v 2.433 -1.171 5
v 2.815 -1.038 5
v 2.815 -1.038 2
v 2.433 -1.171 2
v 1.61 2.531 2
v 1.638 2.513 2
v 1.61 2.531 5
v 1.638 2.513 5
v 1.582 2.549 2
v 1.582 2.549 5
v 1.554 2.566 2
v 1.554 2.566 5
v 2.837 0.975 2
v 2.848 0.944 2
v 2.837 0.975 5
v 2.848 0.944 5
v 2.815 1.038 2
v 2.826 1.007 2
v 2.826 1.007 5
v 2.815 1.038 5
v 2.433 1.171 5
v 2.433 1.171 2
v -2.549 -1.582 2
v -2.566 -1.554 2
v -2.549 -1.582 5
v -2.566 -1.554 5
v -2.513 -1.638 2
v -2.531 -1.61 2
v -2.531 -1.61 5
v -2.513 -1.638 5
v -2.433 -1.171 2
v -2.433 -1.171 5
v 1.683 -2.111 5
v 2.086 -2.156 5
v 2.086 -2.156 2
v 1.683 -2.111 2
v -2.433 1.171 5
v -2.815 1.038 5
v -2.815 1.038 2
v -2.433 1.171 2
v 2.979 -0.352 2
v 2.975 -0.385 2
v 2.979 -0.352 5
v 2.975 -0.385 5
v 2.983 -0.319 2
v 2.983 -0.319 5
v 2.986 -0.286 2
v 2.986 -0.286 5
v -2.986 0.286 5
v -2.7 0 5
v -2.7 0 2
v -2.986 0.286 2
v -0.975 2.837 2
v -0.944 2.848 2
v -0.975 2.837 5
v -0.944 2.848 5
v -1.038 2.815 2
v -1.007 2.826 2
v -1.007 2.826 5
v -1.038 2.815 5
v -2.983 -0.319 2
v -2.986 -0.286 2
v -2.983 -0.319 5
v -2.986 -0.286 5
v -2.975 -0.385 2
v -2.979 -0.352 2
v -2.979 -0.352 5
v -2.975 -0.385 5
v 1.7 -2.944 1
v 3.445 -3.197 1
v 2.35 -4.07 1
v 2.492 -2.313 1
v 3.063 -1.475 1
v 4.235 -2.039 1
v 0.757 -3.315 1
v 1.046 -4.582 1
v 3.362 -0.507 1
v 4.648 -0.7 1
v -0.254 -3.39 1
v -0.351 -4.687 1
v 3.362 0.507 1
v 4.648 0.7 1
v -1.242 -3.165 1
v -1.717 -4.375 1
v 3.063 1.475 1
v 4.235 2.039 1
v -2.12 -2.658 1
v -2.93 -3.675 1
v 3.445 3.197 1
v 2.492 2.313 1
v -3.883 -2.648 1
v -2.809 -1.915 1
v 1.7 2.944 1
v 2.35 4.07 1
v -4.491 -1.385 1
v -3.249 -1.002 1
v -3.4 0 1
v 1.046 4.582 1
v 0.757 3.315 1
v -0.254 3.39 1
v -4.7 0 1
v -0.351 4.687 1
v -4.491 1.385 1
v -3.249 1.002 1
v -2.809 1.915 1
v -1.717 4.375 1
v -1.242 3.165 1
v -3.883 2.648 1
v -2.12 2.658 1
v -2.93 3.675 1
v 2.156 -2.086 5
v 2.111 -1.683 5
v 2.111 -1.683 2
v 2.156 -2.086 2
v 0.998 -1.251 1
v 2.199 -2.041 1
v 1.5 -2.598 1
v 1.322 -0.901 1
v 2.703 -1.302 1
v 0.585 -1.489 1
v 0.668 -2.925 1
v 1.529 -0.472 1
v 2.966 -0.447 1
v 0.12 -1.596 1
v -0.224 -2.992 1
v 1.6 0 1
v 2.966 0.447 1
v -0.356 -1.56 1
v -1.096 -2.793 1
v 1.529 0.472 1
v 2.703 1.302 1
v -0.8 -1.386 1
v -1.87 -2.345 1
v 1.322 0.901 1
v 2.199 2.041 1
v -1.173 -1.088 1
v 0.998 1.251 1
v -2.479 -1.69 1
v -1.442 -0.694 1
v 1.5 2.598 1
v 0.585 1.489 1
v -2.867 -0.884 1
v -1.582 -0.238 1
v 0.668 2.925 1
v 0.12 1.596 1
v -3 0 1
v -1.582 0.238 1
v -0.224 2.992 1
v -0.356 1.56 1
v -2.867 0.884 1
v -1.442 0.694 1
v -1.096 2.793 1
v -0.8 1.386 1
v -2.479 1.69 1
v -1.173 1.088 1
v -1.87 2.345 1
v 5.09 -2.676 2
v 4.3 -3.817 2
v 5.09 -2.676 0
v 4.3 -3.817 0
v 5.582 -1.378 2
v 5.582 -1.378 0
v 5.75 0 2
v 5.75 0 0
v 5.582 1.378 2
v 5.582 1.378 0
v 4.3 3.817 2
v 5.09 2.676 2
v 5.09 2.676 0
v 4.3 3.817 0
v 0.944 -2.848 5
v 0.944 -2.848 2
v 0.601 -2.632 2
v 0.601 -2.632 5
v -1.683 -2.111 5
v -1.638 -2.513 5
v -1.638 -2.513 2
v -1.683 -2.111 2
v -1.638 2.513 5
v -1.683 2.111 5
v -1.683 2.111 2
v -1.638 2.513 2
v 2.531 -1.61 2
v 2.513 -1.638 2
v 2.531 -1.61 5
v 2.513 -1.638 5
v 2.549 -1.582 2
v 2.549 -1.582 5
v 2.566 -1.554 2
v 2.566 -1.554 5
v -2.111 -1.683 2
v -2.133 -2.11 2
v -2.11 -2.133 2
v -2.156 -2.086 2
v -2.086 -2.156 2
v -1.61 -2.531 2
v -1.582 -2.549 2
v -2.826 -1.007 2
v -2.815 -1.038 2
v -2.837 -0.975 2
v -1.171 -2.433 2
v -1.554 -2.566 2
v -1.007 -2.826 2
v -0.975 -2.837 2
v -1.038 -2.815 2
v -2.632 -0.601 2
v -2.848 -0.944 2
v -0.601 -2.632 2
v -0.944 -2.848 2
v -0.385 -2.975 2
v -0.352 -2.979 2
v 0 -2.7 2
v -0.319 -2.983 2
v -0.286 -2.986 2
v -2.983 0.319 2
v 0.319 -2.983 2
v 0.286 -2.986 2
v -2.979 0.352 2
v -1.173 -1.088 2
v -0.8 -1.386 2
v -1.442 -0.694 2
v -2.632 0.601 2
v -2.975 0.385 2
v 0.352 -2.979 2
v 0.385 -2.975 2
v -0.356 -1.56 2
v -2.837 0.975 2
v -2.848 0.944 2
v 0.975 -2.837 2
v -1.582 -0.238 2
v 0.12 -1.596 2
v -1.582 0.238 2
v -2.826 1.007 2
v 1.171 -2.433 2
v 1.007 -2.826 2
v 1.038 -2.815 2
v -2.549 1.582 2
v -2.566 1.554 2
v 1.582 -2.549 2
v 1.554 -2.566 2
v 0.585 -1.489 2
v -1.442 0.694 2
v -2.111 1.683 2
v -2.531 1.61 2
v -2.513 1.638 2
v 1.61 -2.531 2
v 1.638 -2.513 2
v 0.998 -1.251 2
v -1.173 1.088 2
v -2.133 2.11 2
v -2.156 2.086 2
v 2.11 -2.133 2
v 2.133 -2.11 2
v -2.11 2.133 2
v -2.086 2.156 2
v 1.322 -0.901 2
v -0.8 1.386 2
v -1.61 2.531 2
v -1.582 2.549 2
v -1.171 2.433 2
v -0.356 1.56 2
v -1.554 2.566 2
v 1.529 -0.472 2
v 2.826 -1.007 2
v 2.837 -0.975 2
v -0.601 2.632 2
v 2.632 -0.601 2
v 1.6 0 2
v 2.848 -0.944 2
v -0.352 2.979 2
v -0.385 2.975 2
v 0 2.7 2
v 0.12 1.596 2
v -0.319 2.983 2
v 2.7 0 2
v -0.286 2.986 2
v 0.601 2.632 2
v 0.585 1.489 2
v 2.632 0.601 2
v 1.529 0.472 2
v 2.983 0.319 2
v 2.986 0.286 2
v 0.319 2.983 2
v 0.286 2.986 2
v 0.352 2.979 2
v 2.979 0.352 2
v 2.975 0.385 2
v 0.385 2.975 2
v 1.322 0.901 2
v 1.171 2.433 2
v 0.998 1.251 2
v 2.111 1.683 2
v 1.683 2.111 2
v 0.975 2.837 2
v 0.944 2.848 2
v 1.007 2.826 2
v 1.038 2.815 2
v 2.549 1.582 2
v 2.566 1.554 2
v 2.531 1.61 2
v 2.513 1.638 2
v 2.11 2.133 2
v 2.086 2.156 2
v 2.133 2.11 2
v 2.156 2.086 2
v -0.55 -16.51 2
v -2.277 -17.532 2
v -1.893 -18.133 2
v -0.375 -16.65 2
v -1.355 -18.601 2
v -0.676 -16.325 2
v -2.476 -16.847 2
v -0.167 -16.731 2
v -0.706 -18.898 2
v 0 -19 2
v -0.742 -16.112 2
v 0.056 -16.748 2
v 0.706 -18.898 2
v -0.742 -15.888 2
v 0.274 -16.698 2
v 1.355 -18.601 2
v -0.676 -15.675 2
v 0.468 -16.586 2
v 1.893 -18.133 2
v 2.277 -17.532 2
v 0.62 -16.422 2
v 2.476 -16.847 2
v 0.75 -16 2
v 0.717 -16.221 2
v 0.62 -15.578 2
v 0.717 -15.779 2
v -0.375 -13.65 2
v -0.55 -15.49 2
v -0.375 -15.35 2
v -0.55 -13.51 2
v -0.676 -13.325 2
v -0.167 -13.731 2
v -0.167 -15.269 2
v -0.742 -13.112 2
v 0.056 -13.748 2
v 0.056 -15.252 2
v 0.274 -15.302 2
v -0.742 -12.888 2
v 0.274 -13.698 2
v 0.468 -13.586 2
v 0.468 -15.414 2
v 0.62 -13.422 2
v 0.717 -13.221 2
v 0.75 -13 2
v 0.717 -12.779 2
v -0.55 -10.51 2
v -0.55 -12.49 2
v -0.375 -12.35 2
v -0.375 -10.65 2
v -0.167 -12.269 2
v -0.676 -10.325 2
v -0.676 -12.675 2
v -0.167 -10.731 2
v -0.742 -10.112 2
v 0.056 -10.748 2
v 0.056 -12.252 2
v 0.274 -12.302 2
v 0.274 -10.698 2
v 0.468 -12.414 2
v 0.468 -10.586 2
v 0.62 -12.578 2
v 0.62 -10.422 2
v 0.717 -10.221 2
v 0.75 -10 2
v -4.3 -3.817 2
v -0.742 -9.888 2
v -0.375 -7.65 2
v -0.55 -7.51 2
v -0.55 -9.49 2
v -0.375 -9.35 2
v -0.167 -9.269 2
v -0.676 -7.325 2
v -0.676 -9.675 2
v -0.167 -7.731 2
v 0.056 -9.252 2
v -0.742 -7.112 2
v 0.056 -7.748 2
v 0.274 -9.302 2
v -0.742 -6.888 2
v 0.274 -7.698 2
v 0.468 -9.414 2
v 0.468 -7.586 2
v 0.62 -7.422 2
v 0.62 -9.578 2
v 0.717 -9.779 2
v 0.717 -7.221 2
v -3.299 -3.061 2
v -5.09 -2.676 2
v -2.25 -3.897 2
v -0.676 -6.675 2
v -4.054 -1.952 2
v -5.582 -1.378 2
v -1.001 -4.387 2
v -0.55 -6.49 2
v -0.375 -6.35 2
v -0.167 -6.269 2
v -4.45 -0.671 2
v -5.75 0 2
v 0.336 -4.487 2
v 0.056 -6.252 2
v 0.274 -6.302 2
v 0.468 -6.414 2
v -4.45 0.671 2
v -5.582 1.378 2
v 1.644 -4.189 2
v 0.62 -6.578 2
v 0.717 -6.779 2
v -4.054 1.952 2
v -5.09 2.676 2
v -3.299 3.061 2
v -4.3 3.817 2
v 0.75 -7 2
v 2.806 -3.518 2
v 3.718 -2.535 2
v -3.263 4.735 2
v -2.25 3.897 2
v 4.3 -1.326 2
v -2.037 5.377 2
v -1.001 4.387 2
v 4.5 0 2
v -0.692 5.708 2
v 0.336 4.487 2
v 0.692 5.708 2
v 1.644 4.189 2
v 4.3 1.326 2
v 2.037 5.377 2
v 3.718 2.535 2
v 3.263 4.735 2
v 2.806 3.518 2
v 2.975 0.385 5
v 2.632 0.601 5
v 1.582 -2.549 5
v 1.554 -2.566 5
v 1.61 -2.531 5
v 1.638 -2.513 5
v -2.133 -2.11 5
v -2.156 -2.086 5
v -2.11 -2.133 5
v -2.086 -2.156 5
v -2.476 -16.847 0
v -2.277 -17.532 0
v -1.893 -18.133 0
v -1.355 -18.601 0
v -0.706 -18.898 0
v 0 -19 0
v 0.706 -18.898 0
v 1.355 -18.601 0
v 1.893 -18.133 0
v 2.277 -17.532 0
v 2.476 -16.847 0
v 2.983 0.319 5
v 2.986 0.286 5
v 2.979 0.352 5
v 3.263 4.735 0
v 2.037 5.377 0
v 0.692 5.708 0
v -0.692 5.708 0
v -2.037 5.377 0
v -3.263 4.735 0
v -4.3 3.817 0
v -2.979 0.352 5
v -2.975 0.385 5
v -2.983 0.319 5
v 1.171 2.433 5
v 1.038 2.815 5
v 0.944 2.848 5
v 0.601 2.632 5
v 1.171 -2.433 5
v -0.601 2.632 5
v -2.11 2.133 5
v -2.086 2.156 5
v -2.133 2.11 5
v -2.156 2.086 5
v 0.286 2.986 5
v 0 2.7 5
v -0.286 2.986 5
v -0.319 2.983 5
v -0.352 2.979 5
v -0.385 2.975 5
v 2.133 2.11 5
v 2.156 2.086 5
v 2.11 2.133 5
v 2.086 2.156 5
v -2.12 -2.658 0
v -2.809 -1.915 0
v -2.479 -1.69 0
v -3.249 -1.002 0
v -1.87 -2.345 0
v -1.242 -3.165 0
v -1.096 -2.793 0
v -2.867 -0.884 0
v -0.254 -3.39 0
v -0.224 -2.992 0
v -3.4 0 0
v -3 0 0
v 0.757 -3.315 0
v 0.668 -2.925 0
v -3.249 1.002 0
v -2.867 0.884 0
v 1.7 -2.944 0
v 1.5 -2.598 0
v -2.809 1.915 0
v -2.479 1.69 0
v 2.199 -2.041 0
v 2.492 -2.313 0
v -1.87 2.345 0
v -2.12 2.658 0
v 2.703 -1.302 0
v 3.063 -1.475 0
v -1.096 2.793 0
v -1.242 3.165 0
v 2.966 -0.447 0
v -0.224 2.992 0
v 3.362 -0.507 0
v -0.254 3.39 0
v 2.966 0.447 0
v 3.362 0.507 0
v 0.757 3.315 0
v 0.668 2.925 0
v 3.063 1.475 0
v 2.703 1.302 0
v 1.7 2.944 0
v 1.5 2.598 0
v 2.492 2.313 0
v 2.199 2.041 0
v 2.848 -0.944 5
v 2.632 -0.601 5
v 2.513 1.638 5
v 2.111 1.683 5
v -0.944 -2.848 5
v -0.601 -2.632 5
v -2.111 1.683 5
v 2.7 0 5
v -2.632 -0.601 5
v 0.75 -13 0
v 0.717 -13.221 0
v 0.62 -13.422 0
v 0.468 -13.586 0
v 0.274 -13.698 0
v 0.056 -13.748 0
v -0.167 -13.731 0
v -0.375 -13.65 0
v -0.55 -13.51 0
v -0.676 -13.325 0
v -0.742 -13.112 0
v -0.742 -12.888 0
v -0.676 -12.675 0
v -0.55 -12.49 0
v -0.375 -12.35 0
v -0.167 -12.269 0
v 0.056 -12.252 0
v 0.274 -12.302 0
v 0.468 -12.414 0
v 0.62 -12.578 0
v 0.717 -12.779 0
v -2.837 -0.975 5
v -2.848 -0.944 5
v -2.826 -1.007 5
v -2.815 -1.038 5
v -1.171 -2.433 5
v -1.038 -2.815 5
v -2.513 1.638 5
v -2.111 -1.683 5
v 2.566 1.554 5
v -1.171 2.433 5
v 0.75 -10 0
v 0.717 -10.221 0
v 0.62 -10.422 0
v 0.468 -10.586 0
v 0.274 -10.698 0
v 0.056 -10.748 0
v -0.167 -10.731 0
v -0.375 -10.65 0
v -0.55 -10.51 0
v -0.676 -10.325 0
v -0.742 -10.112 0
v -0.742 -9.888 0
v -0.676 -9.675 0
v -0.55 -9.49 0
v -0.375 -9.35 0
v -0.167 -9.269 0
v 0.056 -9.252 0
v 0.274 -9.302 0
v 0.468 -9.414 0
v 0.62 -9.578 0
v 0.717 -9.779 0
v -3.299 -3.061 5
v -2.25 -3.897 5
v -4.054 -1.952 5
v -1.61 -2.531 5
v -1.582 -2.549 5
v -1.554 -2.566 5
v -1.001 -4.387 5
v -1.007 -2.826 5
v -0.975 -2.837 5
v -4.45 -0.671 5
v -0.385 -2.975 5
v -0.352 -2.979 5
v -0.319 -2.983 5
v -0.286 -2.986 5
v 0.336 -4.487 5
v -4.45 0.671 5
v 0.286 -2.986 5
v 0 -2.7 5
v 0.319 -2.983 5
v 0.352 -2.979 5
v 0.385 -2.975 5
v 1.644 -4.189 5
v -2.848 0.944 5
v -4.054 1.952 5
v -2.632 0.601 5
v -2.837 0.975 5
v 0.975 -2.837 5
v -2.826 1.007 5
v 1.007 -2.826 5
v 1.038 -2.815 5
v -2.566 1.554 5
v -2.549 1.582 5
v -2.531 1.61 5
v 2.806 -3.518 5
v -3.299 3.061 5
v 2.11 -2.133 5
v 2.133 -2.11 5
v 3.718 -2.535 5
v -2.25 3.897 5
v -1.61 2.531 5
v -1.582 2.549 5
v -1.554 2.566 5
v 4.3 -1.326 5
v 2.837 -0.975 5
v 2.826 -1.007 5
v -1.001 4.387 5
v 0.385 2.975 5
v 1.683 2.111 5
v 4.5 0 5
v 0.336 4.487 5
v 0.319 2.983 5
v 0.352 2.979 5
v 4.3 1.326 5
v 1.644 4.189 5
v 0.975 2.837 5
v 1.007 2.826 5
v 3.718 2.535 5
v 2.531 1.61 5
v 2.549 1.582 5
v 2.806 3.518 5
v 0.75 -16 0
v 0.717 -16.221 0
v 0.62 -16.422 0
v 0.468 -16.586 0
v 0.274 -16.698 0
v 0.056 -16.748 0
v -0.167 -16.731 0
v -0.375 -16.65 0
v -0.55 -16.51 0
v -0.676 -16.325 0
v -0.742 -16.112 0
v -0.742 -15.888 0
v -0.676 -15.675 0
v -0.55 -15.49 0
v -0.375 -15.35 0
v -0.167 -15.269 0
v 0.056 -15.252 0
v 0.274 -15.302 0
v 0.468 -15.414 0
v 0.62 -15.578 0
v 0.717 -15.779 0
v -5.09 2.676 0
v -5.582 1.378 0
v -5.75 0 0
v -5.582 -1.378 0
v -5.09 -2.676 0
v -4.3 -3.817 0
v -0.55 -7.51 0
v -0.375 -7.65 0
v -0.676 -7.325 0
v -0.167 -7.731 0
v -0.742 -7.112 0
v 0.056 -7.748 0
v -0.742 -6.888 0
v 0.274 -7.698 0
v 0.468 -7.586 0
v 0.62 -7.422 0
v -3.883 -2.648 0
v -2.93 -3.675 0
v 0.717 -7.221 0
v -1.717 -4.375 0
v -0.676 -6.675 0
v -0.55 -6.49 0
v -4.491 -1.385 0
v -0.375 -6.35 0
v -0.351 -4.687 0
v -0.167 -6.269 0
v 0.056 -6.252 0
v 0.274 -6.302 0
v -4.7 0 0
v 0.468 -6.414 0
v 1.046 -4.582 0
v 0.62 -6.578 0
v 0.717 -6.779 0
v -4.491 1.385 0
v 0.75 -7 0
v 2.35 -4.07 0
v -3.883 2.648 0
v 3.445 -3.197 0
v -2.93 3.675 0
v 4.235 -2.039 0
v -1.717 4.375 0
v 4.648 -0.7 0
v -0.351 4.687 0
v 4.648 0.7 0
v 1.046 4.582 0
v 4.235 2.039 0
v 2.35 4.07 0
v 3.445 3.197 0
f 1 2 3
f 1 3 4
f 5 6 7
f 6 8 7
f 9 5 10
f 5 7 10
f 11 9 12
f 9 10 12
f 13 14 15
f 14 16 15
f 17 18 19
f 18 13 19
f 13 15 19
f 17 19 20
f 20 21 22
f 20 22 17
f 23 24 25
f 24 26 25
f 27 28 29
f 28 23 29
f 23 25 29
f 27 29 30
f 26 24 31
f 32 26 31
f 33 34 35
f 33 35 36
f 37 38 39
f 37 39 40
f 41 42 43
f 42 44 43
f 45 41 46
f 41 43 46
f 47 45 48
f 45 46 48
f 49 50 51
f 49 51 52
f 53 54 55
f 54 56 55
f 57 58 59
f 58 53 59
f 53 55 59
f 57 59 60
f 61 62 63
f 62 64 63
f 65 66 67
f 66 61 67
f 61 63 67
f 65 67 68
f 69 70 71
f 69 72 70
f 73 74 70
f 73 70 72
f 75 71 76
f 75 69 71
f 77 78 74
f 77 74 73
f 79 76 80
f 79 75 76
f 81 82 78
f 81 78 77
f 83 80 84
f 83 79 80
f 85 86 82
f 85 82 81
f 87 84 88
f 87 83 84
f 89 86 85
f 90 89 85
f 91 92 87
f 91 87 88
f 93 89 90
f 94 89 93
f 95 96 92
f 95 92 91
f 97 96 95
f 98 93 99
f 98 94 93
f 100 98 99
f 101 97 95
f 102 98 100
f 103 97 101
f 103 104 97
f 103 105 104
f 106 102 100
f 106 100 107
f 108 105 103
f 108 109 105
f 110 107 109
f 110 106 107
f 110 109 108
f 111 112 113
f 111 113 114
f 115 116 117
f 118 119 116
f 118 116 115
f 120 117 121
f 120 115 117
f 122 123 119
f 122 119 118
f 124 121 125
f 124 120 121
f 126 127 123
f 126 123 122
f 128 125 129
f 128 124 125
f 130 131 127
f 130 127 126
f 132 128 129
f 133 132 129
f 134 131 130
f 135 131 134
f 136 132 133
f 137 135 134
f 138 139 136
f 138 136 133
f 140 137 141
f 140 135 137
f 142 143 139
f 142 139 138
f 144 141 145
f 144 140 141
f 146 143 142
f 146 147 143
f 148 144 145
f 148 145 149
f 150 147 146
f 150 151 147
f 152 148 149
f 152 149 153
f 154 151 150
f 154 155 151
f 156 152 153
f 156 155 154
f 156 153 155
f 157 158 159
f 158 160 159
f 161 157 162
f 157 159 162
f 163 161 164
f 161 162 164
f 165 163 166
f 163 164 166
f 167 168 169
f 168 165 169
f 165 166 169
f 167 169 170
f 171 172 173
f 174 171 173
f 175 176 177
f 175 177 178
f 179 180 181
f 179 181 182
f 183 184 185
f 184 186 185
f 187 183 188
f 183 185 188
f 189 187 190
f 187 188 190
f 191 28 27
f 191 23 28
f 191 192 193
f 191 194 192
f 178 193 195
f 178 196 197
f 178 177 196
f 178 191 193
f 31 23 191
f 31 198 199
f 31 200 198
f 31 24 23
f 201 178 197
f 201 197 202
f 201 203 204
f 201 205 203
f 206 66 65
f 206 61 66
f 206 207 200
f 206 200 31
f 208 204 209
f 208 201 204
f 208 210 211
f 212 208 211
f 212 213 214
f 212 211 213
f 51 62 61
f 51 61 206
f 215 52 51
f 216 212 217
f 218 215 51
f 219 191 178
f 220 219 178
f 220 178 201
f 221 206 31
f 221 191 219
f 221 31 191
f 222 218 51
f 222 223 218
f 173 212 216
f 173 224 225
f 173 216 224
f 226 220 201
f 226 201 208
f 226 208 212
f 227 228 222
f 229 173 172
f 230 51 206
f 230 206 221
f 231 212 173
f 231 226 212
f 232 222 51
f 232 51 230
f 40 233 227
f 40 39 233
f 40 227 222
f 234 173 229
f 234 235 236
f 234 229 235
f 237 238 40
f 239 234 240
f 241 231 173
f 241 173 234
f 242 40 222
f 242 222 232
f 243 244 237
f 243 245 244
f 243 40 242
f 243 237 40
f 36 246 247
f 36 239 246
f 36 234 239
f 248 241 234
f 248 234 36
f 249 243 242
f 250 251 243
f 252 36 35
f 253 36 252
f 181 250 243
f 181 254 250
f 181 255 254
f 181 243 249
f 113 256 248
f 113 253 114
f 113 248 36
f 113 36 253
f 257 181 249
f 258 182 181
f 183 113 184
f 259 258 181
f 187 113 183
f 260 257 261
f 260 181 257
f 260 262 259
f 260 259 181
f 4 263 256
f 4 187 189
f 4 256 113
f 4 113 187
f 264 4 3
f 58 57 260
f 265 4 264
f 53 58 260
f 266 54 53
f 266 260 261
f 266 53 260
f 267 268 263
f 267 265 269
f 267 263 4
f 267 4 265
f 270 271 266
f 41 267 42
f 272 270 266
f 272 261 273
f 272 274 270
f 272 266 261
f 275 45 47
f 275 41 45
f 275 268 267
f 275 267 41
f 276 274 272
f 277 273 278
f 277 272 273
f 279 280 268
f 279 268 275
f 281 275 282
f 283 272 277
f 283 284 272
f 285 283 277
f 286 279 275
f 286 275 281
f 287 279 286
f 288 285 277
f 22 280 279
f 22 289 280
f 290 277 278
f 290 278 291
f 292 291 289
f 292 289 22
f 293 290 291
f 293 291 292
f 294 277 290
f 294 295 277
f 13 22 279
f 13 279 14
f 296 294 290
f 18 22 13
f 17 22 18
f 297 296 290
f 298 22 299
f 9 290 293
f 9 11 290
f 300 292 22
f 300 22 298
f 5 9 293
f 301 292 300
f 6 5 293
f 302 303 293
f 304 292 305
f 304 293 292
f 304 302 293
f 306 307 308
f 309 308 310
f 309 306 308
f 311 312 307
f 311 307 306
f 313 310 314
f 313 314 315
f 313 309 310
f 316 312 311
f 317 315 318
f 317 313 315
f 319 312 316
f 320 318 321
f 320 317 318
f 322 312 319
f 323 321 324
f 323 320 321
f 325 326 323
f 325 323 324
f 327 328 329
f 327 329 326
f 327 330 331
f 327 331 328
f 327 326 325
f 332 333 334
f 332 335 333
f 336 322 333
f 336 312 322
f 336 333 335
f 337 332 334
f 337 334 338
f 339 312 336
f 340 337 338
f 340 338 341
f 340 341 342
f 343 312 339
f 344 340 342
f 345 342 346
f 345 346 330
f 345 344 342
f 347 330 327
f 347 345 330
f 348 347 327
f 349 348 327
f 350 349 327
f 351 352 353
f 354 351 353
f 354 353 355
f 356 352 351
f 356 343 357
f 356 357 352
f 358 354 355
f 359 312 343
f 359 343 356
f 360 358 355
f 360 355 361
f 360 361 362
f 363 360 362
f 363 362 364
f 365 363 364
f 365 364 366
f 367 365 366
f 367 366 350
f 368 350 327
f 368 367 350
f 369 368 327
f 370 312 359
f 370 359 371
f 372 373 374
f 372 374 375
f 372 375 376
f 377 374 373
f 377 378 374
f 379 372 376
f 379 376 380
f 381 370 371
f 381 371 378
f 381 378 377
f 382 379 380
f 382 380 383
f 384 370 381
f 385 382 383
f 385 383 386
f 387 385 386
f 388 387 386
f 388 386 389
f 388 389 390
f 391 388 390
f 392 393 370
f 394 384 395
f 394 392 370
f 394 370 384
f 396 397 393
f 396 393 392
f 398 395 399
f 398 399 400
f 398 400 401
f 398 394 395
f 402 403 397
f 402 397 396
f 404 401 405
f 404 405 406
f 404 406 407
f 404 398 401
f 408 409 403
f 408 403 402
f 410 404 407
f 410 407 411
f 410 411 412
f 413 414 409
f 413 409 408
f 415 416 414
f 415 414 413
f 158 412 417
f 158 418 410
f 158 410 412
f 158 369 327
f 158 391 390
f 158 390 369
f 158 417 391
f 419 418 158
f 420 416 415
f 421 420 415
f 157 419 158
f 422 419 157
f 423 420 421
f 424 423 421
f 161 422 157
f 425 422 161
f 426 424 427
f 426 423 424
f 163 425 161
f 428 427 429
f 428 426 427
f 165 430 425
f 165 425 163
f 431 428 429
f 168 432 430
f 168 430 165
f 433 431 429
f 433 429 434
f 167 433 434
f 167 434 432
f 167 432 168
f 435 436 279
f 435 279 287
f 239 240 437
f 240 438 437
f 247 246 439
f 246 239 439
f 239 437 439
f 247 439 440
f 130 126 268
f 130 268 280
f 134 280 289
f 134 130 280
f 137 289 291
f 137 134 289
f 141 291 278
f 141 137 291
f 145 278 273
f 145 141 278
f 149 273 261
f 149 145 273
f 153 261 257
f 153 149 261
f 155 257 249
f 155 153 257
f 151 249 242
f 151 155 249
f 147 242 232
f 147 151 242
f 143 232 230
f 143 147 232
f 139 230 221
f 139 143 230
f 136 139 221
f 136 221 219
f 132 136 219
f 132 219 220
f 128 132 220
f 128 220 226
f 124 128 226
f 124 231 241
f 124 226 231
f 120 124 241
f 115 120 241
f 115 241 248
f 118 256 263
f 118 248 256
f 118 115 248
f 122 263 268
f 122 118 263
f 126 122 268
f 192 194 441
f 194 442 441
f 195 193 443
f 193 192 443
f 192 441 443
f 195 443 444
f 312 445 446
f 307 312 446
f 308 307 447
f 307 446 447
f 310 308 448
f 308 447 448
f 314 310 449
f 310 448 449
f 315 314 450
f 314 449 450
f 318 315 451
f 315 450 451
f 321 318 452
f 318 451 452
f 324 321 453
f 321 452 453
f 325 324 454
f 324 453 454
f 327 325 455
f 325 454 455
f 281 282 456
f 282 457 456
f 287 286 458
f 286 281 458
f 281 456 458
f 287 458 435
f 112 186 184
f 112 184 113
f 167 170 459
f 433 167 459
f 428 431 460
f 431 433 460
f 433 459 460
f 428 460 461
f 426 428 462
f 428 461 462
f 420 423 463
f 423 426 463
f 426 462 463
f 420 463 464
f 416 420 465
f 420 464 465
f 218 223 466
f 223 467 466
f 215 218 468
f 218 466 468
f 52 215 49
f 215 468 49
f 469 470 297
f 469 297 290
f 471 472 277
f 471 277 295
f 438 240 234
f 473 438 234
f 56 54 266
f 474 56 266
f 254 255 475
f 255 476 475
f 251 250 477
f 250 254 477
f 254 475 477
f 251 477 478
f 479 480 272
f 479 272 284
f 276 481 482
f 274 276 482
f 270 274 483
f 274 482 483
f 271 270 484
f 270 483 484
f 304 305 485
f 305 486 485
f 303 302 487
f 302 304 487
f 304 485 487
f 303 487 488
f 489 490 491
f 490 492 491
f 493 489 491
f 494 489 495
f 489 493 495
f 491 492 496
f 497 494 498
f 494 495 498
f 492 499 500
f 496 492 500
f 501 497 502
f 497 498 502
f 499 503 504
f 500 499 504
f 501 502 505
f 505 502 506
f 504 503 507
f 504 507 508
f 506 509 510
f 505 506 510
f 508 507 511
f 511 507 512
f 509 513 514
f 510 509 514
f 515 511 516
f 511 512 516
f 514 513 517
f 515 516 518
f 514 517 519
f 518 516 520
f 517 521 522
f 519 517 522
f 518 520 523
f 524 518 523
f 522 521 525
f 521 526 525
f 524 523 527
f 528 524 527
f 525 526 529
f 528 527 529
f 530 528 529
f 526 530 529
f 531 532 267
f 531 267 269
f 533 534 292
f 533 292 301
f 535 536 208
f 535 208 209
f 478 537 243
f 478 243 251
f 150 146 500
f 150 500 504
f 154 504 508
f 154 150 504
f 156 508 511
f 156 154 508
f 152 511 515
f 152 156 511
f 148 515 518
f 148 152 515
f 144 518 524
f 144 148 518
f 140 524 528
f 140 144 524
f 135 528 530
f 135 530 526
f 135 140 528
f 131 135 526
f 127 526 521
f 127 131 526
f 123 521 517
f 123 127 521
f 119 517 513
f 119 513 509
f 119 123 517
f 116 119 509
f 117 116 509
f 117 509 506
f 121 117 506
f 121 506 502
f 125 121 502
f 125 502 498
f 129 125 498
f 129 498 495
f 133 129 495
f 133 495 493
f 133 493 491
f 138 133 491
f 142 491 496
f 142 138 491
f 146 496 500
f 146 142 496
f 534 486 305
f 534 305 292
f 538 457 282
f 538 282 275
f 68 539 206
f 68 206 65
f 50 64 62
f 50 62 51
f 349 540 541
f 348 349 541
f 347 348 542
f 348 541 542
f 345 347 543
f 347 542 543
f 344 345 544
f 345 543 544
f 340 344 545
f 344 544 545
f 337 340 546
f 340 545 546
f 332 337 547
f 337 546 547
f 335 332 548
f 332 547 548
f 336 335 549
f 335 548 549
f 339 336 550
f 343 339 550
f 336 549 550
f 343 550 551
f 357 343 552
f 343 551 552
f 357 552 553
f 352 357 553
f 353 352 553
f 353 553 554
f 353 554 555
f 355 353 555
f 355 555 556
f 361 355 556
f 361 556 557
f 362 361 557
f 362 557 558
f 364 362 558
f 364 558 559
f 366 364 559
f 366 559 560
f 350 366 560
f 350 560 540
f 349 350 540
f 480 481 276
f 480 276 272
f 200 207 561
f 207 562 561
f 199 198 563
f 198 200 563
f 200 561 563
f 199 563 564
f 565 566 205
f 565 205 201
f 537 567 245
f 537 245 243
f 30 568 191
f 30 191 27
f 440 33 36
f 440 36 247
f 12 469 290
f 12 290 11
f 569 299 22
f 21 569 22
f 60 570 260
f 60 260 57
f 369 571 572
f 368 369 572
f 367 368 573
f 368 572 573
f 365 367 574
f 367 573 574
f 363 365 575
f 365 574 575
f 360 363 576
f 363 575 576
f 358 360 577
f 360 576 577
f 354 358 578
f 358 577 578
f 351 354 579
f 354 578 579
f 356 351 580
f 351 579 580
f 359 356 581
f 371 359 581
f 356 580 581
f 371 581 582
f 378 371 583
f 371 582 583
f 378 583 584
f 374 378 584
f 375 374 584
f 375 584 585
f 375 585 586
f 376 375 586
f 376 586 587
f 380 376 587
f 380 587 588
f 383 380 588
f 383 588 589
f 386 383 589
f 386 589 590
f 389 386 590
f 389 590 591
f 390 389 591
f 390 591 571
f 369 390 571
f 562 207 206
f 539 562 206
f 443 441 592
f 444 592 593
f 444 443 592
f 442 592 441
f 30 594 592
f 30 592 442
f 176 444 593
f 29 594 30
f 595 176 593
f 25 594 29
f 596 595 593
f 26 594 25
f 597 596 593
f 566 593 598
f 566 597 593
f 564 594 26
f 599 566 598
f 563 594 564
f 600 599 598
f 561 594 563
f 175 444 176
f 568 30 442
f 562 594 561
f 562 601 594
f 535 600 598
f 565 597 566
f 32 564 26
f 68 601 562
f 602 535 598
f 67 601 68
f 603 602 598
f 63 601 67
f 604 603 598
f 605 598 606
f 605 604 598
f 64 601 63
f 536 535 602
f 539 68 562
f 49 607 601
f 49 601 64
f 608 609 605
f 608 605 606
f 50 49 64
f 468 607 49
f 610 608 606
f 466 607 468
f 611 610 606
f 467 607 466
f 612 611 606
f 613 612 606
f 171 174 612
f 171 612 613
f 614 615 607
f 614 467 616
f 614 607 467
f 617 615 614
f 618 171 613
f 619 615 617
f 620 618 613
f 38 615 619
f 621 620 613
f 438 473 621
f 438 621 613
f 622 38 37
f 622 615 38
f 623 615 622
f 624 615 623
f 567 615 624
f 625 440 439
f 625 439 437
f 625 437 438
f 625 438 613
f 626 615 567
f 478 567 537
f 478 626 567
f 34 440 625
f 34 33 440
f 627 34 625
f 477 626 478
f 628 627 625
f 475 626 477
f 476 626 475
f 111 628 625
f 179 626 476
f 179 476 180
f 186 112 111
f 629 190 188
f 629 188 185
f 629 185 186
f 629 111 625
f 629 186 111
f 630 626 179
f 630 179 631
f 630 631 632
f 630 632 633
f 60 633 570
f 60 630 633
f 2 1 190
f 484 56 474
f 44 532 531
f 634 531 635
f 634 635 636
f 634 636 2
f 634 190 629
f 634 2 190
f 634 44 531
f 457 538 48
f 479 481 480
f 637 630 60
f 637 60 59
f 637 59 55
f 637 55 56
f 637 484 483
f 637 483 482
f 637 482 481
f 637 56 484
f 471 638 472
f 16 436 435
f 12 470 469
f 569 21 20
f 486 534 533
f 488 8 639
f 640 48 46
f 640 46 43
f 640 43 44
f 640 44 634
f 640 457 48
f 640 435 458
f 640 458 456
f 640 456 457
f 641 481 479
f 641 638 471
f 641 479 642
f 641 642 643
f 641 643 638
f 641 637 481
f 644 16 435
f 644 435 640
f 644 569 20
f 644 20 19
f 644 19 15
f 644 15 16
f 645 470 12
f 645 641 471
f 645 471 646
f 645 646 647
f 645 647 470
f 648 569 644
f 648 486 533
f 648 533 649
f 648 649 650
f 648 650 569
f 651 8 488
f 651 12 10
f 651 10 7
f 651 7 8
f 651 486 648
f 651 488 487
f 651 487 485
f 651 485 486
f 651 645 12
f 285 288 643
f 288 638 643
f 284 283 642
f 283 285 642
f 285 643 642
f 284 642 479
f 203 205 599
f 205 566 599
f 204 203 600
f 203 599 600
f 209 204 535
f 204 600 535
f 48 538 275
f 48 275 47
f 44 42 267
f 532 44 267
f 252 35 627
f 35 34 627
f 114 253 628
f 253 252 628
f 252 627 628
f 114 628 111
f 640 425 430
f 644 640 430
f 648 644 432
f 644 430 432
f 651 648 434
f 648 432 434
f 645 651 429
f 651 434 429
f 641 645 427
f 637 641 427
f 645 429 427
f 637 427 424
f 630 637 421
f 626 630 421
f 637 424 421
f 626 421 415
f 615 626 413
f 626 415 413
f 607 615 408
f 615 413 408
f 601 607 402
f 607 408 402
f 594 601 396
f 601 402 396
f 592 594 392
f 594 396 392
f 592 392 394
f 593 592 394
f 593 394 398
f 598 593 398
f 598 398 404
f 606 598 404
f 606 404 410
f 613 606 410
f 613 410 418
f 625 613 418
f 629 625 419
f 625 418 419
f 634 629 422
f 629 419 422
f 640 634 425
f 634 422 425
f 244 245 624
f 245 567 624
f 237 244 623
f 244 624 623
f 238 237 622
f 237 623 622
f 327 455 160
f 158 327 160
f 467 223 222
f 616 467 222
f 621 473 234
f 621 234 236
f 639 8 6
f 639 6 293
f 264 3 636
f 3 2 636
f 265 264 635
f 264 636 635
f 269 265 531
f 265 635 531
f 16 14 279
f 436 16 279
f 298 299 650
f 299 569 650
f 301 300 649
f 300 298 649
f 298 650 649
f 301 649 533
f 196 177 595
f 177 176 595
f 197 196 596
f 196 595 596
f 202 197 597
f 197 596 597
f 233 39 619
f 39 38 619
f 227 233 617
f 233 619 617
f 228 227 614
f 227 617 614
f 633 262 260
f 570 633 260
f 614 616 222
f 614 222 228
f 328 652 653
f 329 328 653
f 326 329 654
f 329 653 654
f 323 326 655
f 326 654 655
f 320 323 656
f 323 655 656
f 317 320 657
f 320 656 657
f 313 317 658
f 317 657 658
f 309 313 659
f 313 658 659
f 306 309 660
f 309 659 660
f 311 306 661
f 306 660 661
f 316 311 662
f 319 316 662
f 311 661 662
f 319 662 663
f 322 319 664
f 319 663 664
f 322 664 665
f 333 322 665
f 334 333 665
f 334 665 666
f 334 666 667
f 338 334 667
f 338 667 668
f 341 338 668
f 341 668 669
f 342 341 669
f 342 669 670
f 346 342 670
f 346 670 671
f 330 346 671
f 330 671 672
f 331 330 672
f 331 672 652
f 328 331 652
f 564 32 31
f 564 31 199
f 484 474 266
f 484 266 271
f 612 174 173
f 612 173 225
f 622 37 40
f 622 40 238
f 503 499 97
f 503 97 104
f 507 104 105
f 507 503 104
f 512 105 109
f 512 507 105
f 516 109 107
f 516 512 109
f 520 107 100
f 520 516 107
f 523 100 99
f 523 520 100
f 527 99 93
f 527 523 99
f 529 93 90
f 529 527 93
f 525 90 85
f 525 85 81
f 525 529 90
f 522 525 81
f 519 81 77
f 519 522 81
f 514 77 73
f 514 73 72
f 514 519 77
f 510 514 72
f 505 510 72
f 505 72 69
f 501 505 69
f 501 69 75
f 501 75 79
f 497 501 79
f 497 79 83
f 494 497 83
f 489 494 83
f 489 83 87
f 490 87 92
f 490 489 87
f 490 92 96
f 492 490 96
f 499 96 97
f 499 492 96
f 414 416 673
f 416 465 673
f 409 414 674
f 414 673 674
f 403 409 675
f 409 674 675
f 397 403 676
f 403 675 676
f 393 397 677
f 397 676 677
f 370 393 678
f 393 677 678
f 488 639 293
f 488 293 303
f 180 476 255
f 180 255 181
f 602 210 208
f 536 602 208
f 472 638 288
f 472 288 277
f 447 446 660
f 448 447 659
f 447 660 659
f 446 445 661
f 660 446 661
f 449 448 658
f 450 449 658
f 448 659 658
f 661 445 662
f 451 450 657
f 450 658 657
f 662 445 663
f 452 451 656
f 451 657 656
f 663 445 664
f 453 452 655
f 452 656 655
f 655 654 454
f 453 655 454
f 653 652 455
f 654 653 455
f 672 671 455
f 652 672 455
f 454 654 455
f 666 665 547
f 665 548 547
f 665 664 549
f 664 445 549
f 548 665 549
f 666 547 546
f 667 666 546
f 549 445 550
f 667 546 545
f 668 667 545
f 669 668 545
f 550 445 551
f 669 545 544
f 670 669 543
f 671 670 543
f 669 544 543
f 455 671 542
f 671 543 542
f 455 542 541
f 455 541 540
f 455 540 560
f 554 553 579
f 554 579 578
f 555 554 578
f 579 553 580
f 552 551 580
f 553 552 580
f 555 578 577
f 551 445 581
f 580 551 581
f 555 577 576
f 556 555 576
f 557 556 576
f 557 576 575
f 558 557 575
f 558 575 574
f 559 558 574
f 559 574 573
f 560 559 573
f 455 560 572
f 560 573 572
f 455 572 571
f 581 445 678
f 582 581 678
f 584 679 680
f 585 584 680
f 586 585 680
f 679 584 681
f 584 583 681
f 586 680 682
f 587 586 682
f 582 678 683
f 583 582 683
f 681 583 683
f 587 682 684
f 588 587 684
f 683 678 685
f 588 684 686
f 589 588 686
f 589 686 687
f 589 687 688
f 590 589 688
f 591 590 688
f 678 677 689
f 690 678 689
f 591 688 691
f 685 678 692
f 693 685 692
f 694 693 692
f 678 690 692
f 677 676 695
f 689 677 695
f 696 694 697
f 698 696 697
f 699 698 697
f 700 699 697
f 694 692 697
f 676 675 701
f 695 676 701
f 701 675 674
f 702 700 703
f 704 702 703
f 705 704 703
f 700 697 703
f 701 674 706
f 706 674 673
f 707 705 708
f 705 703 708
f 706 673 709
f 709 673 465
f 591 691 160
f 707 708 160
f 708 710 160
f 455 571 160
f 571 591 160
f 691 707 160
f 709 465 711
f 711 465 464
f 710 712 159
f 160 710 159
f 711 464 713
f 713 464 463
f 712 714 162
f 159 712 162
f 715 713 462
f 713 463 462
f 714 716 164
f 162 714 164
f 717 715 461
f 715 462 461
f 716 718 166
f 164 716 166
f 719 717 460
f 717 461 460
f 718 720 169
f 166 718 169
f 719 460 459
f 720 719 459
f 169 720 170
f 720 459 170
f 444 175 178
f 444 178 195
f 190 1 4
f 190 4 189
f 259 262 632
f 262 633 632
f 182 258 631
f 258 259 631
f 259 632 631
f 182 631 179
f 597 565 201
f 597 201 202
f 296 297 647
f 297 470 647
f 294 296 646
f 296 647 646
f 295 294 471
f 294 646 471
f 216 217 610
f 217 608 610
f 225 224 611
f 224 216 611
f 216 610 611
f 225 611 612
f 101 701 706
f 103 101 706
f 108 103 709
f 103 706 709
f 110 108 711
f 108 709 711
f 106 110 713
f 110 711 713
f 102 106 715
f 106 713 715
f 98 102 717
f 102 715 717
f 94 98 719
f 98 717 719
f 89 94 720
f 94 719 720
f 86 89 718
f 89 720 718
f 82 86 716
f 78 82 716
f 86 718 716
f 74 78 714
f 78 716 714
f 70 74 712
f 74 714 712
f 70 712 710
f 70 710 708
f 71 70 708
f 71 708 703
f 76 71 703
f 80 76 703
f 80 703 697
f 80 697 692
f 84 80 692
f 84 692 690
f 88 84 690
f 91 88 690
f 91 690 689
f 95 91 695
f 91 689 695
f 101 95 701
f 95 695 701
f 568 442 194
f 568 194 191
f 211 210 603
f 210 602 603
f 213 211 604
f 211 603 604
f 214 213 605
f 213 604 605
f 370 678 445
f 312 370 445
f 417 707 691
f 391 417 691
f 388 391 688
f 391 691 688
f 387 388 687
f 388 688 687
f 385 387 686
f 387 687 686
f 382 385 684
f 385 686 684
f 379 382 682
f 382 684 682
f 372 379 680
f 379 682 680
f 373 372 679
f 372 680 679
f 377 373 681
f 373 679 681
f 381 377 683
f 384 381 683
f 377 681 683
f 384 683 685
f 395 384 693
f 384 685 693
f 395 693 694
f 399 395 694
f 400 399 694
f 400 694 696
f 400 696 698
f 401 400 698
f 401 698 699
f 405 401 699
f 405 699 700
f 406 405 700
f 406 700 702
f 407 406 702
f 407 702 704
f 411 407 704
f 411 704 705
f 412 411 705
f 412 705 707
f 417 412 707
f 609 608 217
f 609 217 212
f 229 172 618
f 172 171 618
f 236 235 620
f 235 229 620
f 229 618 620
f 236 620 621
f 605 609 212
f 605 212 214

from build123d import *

# Parameters (mm, degrees)
ESQUISSE1_R                  = 5.75
ESQUISSE1_R_2                = 1.6
BOSS_EXTRU_1_DEPTH           = 5
ESQUISSE2_R                  = 3
ENL_V_MAT_EXTRU_1_DEPTH      = 3
ENL_V_START                  = -3
ESQUISSE3_R                  = 5.75
ESQUISSE3_R_2                = 4.5
ENL_V_MAT_EXTRU_2_DEPTH      = 3
BOSS_EXTRU_2_DEPTH           = 2
R_P_TITION_CIRCULAIRE1_COUNT = 2
ESQUISSE5_R                  = 0.75
ENL_V_MAT_EXTRU_3_DEPTH      = 3
R_P_TITION_CIRCULAIRE2_COUNT = 2
BOSS_EXTRU_3_DEPTH           = 3
R_P_TITION_CIRCULAIRE3_COUNT = 28
ENL_V_START_2                = -1
ESQUISSE7_R                  = 3
ESQUISSE7_R_2                = 1.6
ENL_V_MAT_EXTRU_4_DEPTH      = 1
ESQUISSE8_R                  = 4.7
ESQUISSE8_R_2                = 3.4
ENL_V_MAT_EXTRU_5_DEPTH      = 1
SKETCH1_R                    = 0.75
CUT_EXTRUDE1_DEPTH           = 10


with BuildPart() as part:
    # Esquisse1 → Boss.-Extru.1 (new body)
    with BuildSketch(Plane.XY):
        Circle(ESQUISSE1_R)
        Circle(ESQUISSE1_R_2, mode=Mode.SUBTRACT)
    extrude(amount=BOSS_EXTRU_1_DEPTH)

    # Esquisse2 → Enlèv. mat.-Extru.1 (cut)
    with BuildSketch(Plane.XY.offset(5)):
        Circle(ESQUISSE2_R)
    extrude(amount=-ENL_V_MAT_EXTRU_1_DEPTH, mode=Mode.SUBTRACT)

    # Esquisse3 → Enlèv. mat.-Extru.2 (cut)
    with BuildSketch(Plane.XY.offset(5).offset(ENL_V_START)):
        Circle(ESQUISSE3_R)
        Circle(ESQUISSE3_R_2, mode=Mode.SUBTRACT)
    extrude(amount=ENL_V_MAT_EXTRU_2_DEPTH, mode=Mode.SUBTRACT)

    # Esquisse4 → Boss.-Extru.2 (add)
    with BuildSketch(Plane(origin=(0, 0, 0), x_dir=(-1, 0, 0), z_dir=(0, 0, -1))):
        with BuildLine():
            Line((-4.3, 3.817394399), (-2.475852955, 16.846629695))
            ThreePointArc((-2.475852955, 16.846629695), (0, 19), (2.475852955, 16.846629695))
            Line((2.475852955, 16.846629695), (4.3, 3.817394399))
            ThreePointArc((4.3, 3.817394399), (0, 5.75), (-4.3, 3.817394399))
        make_face()
    boss_extru_2 = extrude(amount=-BOSS_EXTRU_2_DEPTH)

    # Répétition circulaire1: Boss.-Extru.2 ×2 about axis
    r_p_tition_circulaire1_axis = Axis((0, 0, 0), (0, 0, 1))
    for i in range(1, R_P_TITION_CIRCULAIRE1_COUNT):
        add(boss_extru_2.rotate(r_p_tition_circulaire1_axis, i * 360 / R_P_TITION_CIRCULAIRE1_COUNT))

    # Esquisse5 → Enlèv. mat.-Extru.3 (cut)
    with BuildSketch(Plane(origin=(0, 0, 0), x_dir=(-1, 0, 0), z_dir=(0, 0, -1))):
        with Locations((0, 7)):
            Circle(ESQUISSE5_R)
        with Locations((0, 10)):
            Circle(ESQUISSE5_R)
        with Locations((0, 13)):
            Circle(ESQUISSE5_R)
        with Locations((0, 16)):
            Circle(ESQUISSE5_R)
    enl_v_mat_extru_3 = extrude(amount=-ENL_V_MAT_EXTRU_3_DEPTH, mode=Mode.SUBTRACT)

    # Répétition circulaire2: Enlèv. mat.-Extru.3 ×2 about axis
    r_p_tition_circulaire2_axis = Axis((0, 0, 0), (0, 0, 1))
    for i in range(1, R_P_TITION_CIRCULAIRE2_COUNT):
        add(enl_v_mat_extru_3.rotate(r_p_tition_circulaire2_axis, i * 360 / R_P_TITION_CIRCULAIRE2_COUNT), mode=Mode.SUBTRACT)

    # Esquisse6 → Boss.-Extru.3 (add)
    with BuildSketch(Plane.XY.offset(5)):
        Polygon((-0.3, 3), (0, 2.7), (0.3, 3), align=None)
    boss_extru_3 = extrude(amount=-BOSS_EXTRU_3_DEPTH)

    # Répétition circulaire3: Boss.-Extru.3 ×28 about axis
    r_p_tition_circulaire3_axis = Axis((0, 0, 0), (0, 0, 1))
    for i in range(1, R_P_TITION_CIRCULAIRE3_COUNT):
        add(boss_extru_3.rotate(r_p_tition_circulaire3_axis, i * 360 / R_P_TITION_CIRCULAIRE3_COUNT))

    # Esquisse7 → Enlèv. mat.-Extru.4 (cut)
    with BuildSketch(Plane(origin=(0, 0, 0), x_dir=(-1, 0, 0), z_dir=(0, 0, -1)).offset(ENL_V_START_2)):
        Circle(ESQUISSE7_R)
        Circle(ESQUISSE7_R_2, mode=Mode.SUBTRACT)
    extrude(amount=ENL_V_MAT_EXTRU_4_DEPTH, mode=Mode.SUBTRACT)

    # Esquisse8 → Enlèv. mat.-Extru.5 (cut)
    with BuildSketch(Plane(origin=(0, 0, 0), x_dir=(-1, 0, 0), z_dir=(0, 0, -1))):
        Circle(ESQUISSE8_R)
        Circle(ESQUISSE8_R_2, mode=Mode.SUBTRACT)
    extrude(amount=-ENL_V_MAT_EXTRU_5_DEPTH, mode=Mode.SUBTRACT)

    # Sketch1 → Cut-Extrude1 (cut)
    with BuildSketch(Plane(origin=(0, 0, 0), x_dir=(-1, 0, 0), z_dir=(0, 0, -1))):
        with BuildLine():
            Line((-2.475852955, 16.846629695), (-4.3, 3.817394399))
            ThreePointArc((-4.3, 3.817394399), (0, 5.75), (4.3, 3.817394399))
            Line((4.3, 3.817394399), (2.475852955, 16.846629695))
            ThreePointArc((2.475852955, 16.846629695), (0, 19), (-2.475852955, 16.846629695))
        make_face()
        with Locations((0, 7)):
            Circle(SKETCH1_R, mode=Mode.SUBTRACT)
        with Locations((0, 10)):
            Circle(SKETCH1_R, mode=Mode.SUBTRACT)
        with Locations((0, 13)):
            Circle(SKETCH1_R, mode=Mode.SUBTRACT)
        with Locations((0, 16)):
            Circle(SKETCH1_R, mode=Mode.SUBTRACT)
    extrude(amount=-CUT_EXTRUDE1_DEPTH, mode=Mode.SUBTRACT)


solid = part.part
